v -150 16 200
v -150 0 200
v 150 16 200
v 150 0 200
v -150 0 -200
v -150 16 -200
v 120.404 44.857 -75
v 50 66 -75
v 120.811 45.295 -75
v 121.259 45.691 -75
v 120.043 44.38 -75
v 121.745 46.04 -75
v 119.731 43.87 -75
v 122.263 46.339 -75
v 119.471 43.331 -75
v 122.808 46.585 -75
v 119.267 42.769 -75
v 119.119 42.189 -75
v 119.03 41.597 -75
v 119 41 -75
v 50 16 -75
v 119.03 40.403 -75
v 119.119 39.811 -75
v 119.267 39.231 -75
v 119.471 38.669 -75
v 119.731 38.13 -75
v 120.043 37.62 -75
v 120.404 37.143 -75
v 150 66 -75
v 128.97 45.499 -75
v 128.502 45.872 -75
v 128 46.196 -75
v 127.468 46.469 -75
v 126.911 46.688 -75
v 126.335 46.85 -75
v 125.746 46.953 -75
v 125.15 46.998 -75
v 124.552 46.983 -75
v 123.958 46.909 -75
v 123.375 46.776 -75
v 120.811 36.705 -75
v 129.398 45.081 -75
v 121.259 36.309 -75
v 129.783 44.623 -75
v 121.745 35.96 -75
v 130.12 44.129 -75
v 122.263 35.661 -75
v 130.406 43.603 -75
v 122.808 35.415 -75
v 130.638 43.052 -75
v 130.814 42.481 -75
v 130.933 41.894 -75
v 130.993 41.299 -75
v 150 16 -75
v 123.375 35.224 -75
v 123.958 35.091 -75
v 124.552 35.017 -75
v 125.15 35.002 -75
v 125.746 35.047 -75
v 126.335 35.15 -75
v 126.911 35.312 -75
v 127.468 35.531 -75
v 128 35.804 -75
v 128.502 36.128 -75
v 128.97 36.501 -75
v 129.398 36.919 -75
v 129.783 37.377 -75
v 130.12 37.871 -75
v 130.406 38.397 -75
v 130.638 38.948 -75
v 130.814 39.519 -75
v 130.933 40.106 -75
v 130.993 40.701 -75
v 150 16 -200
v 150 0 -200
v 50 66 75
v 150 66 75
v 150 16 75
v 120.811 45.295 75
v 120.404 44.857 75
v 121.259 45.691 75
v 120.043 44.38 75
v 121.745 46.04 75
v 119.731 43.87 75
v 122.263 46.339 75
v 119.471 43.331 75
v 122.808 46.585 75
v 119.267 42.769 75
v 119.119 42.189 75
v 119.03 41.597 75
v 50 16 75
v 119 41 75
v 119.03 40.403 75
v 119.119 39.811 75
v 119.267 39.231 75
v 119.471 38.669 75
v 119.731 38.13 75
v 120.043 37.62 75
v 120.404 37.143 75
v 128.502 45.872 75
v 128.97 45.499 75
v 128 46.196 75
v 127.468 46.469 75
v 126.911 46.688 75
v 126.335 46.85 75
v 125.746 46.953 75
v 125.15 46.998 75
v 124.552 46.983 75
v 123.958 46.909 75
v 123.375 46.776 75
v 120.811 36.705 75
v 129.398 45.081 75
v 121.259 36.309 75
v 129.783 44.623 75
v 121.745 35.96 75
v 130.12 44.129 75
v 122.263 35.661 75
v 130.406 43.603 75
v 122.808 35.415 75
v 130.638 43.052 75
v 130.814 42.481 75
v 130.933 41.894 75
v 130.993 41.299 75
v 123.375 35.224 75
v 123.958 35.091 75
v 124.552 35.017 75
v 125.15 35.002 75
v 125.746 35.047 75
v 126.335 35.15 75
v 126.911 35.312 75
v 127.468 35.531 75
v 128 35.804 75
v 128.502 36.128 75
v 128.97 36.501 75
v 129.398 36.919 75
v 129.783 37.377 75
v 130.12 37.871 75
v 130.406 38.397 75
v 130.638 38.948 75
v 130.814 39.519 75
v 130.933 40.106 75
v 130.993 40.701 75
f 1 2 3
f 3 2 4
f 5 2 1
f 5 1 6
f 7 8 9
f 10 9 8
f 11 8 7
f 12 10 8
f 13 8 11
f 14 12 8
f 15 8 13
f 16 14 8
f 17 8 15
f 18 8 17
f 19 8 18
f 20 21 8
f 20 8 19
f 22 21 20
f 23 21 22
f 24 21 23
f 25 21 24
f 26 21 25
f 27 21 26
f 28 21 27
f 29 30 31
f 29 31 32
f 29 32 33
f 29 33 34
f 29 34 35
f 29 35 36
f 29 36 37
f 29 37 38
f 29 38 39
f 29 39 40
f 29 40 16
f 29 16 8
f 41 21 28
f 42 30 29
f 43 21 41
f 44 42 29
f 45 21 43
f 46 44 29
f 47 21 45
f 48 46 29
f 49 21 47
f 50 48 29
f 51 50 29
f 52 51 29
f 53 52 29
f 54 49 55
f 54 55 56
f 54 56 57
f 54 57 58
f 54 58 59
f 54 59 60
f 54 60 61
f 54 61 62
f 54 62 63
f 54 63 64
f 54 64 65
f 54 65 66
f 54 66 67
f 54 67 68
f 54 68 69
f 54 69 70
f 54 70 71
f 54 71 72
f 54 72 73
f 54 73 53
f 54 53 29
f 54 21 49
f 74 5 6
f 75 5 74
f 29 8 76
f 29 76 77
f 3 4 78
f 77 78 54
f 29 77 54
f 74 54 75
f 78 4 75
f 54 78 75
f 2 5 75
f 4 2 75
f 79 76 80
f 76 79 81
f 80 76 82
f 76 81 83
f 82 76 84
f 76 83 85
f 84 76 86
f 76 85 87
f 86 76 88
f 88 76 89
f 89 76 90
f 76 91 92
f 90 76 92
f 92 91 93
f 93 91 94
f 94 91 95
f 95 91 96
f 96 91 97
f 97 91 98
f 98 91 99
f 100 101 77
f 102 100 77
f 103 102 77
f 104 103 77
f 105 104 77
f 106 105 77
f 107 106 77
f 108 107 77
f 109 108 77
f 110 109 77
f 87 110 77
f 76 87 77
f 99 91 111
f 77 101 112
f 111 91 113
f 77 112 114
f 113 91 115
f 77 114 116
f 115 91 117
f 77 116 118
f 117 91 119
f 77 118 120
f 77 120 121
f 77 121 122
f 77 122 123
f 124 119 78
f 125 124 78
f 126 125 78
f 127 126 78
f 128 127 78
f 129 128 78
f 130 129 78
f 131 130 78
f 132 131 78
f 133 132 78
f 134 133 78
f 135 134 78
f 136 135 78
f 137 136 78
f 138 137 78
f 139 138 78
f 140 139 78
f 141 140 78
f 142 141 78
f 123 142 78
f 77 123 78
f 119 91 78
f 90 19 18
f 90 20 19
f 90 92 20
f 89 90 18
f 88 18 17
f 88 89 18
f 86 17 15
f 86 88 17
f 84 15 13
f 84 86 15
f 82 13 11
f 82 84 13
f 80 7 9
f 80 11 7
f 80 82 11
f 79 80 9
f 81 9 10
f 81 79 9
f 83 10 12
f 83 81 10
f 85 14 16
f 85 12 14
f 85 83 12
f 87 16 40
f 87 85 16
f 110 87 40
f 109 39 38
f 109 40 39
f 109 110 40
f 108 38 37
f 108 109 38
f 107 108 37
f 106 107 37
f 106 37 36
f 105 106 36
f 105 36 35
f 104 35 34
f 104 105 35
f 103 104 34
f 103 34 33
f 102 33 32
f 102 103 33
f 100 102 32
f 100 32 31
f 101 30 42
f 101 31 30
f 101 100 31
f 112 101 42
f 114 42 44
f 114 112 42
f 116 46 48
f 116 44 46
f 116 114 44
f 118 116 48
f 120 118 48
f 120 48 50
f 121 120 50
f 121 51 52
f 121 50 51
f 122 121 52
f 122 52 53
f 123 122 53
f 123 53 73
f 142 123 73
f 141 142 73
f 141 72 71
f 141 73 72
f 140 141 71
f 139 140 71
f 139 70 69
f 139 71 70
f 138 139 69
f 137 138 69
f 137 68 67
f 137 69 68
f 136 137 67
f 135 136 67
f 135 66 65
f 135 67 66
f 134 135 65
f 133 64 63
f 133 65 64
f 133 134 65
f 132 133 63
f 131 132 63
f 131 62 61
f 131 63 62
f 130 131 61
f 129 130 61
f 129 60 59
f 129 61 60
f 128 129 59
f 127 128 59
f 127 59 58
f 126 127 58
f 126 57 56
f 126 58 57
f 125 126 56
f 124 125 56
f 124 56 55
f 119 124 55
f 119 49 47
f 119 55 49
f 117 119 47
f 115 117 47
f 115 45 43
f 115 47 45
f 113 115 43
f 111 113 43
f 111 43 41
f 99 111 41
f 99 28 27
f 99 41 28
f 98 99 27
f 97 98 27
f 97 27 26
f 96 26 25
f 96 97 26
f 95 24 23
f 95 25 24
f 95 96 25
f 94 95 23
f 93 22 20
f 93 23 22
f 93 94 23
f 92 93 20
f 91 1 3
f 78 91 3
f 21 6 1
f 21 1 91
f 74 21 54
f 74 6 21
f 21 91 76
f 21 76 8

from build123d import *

# Parameters (mm, degrees)
SKETCH1_W               = 300
SKETCH1_H               = 400
BOSS_EXTRUDE1_DEPTH     = 16
SKETCH2_W               = 100
SKETCH2_H               = 150
BOSS_EXTRUDE2_DEPTH     = 50
CUT_EXTRUDE1_DEPTH      = 321.126537482
CUT_EXTRUDE1_DEPTH_BACK = 321.126537482
SKETCH3_R               = 6


with BuildPart() as part:
    # Sketch1 → Boss-Extrude1 (new body)
    with BuildSketch(Plane(origin=(0, 0, 0), x_dir=(1, 0, 0), z_dir=(0, 1, 0))):
        Rectangle(SKETCH1_W, SKETCH1_H)
    extrude(amount=BOSS_EXTRUDE1_DEPTH)

    # Sketch2 → Boss-Extrude2 (add)
    with BuildSketch(Plane(origin=(0, 16, 0), x_dir=(1, 0, 0), z_dir=(0, 1, 0))):
        with Locations((100, 0)):
            Rectangle(SKETCH2_W, SKETCH2_H)
    extrude(amount=BOSS_EXTRUDE2_DEPTH)

    # Sketch3 → Cut-Extrude1 (cut, two sides: drawn at the far end of the back side and taken through both)
    with BuildSketch(Plane(origin=(0, 0, -75), x_dir=(-1, 0, 0), z_dir=(0, 0, -1)).offset(-CUT_EXTRUDE1_DEPTH_BACK)):
        with Locations((-125, 41)):
            Circle(SKETCH3_R)
    extrude(amount=CUT_EXTRUDE1_DEPTH + CUT_EXTRUDE1_DEPTH_BACK, mode=Mode.SUBTRACT)


solid = part.part
